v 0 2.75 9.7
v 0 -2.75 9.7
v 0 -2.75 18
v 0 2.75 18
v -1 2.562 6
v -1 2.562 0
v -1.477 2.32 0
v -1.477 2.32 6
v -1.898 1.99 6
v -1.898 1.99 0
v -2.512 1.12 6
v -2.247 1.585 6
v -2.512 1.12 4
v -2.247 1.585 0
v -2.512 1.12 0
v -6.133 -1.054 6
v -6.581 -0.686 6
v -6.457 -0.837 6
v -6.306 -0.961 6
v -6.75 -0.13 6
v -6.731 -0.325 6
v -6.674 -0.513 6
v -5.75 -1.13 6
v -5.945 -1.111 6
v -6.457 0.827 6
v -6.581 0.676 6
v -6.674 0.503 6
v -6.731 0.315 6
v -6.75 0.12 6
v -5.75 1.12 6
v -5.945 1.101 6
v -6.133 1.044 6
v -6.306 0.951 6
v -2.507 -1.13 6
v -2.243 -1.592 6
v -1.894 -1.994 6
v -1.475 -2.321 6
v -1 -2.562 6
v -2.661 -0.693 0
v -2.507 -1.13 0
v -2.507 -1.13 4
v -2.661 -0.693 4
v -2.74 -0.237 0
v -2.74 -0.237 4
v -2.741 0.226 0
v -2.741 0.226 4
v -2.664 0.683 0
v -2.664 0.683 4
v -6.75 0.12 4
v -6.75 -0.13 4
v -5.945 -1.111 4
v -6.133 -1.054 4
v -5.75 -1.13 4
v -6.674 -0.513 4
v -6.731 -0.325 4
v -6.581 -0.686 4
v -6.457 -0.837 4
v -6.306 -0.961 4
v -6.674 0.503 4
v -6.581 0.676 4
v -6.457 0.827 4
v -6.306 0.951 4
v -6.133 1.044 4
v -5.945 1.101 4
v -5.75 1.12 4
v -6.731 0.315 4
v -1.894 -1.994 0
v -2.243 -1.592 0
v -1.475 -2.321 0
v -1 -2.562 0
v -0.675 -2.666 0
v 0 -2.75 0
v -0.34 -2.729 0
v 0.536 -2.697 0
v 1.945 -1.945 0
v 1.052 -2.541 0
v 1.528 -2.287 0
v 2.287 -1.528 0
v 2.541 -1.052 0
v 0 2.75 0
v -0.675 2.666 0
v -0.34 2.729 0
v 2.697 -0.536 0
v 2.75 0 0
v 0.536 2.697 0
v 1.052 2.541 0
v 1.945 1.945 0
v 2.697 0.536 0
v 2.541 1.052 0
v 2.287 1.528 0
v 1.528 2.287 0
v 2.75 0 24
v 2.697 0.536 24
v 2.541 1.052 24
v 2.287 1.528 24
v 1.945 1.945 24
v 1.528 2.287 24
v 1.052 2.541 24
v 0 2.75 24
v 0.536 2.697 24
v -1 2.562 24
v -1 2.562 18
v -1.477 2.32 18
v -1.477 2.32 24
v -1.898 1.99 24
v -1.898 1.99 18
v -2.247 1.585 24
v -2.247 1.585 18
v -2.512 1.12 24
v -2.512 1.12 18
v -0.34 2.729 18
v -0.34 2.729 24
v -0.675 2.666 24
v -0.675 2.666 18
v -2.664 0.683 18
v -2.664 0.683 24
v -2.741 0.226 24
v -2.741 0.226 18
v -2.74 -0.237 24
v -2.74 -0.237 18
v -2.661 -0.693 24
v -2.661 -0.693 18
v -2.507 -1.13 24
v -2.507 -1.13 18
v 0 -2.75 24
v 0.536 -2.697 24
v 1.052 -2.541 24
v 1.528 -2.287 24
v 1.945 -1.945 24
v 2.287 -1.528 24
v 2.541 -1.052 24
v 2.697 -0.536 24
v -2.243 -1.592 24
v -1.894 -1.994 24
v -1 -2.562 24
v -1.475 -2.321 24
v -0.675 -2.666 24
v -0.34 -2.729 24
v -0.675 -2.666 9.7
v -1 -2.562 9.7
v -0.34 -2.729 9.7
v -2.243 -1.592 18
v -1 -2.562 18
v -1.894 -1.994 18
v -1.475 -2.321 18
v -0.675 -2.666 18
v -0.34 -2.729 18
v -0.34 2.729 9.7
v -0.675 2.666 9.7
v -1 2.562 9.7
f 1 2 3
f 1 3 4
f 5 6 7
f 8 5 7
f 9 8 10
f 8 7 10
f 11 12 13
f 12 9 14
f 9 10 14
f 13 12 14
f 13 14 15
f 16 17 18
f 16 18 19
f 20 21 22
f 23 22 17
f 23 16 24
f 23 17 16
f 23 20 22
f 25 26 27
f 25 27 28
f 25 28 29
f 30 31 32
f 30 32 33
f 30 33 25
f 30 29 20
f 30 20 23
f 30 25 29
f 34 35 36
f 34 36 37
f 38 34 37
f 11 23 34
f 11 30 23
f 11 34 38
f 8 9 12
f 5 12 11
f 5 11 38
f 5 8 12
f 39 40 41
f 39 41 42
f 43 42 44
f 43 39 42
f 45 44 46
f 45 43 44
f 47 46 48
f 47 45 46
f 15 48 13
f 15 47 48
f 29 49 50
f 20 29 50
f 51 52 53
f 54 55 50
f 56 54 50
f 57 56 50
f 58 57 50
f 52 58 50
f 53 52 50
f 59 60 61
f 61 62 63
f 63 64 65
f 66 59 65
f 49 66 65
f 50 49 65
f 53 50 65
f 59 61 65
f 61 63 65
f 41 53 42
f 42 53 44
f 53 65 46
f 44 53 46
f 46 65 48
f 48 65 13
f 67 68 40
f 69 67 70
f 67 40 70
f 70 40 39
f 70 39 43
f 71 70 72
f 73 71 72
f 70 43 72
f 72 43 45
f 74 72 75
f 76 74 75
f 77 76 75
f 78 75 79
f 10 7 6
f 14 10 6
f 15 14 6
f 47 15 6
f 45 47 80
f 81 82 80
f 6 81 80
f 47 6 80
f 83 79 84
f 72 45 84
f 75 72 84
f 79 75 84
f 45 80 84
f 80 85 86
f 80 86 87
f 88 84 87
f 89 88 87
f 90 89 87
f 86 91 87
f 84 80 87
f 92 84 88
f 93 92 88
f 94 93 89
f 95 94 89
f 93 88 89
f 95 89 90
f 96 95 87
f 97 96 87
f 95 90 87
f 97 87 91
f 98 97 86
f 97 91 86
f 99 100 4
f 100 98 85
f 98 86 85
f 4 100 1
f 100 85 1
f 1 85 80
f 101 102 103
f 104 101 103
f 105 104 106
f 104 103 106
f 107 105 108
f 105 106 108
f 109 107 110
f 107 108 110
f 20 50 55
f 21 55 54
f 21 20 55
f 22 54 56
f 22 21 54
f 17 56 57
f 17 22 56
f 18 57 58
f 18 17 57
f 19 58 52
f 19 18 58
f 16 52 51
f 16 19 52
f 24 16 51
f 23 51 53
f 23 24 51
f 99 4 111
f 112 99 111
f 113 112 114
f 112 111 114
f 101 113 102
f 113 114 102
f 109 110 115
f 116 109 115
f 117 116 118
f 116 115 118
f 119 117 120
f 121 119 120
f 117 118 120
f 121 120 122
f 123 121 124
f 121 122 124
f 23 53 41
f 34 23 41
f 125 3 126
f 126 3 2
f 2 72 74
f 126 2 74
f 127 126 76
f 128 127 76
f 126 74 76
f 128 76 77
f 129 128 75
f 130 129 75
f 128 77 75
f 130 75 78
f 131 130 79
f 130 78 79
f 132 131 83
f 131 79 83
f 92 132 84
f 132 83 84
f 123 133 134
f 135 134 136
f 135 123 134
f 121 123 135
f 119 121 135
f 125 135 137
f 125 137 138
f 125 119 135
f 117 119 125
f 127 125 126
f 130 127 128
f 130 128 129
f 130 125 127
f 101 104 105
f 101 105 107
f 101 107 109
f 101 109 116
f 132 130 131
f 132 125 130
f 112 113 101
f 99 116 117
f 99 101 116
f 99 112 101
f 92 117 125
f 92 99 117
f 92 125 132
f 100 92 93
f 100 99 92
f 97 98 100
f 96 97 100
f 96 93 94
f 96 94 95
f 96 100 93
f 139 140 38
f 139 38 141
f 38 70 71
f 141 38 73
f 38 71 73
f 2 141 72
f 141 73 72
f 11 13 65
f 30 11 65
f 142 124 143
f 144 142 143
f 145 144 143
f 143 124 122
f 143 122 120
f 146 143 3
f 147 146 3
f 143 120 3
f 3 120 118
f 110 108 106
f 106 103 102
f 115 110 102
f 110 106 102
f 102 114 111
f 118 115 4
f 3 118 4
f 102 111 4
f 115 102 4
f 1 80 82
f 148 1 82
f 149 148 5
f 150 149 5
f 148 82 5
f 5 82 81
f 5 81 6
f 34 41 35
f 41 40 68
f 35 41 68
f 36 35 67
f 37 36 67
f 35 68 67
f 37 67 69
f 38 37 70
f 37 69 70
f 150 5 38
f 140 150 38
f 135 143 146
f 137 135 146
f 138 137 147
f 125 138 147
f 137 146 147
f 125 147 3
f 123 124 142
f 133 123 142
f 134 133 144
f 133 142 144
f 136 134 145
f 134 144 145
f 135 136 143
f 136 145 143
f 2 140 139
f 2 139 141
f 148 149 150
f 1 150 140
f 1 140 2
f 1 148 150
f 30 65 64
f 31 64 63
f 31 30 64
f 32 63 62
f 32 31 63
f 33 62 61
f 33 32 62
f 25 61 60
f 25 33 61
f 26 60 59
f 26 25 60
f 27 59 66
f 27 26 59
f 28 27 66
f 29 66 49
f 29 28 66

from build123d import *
from build123d import SkipClean  # not in build123d's __all__

# Parameters (mm, degrees)
F1_DEPTH = 24
F2_DEPTH = 18
F3_DEPTH = 9.7
F4_DEPTH = 6
F5_DEPTH = 6
F6_R     = 1
F7_DEPTH = 4


with BuildPart() as f1:
    # F0 (on Top) → F1 (new body)
    with BuildSketch(Plane.XY):
        with BuildLine():
            ThreePointArc((0, -2.75), (1.9445436483, -1.9445436483), (2.75, 0))
            ThreePointArc((2.75, 0), (1.9445436483, 1.9445436483), (0, 2.75))
            Line((0, 2.75), (0, 1.12))
            Line((0, 1.12), (0, 0))
            Line((0, 0), (0, -1.13))
            Line((0, -1.13), (0, -2.75))
        make_face()
        with BuildLine():
            Line((0, 1.12), (0, 2.75))
            ThreePointArc((0, 2.75), (-0.5087835239, 2.7025246208), (-1, 2.5617376915))
            Line((-1, 2.5617376915), (-1, 1.12))
            Line((-1, 1.12), (0, 1.12))
        make_face()
        with BuildLine():
            ThreePointArc((-1, -2.5617376915), (-0.5087835239, -2.7025246208), (0, -2.75))
            Line((0, -2.75), (0, -1.13))
            Line((0, -1.13), (-1, -1.13))
            Line((-1, -1.13), (-1, -2.5617376915))
        make_face()
        with BuildLine():
            Line((-1, 1.12), (-1, 2.5617376915))
            ThreePointArc((-1, 2.5617376915), (-1.8980182962, 1.9899815445), (-2.5115931199, 1.12))
            Line((-2.5115931199, 1.12), (-1, 1.12))
        make_face()
        Polygon((0, 0), (0, 1.12), (-1, 1.12), (-1, -1.13), (0, -1.13), align=None)
        with BuildLine():
            ThreePointArc((-2.5071098899, -1.13), (-1.8940494052, -1.9937594767), (-1, -2.5617376915))
            Line((-1, -2.5617376915), (-1, -1.13))
            Line((-1, -1.13), (-2.5071098899, -1.13))
        make_face()
        with BuildLine():
            Line((-1, 1.12), (-2.5115931199, 1.12))
            ThreePointArc((-2.5115931199, 1.12), (-2.7499945409, -0.0054794925), (-2.5071098899, -1.13))
            Line((-2.5071098899, -1.13), (-1, -1.13))
            Line((-1, -1.13), (-1, 1.12))
        make_face()
    extrude(amount=F1_DEPTH)

    # F0 (on Top) → F2 (cut)
    with BuildSketch(Plane.XY):
        with BuildLine():
            Line((0, 1.12), (0, 2.75))
            ThreePointArc((0, 2.75), (-0.5087835239, 2.7025246208), (-1, 2.5617376915))
            Line((-1, 2.5617376915), (-1, 1.12))
            Line((-1, 1.12), (0, 1.12))
        make_face()
        with BuildLine():
            ThreePointArc((-1, -2.5617376915), (-0.5087835239, -2.7025246208), (0, -2.75))
            Line((0, -2.75), (0, -1.13))
            Line((0, -1.13), (-1, -1.13))
            Line((-1, -1.13), (-1, -2.5617376915))
        make_face()
        with BuildLine():
            Line((-1, 1.12), (-1, 2.5617376915))
            ThreePointArc((-1, 2.5617376915), (-1.8980182962, 1.9899815445), (-2.5115931199, 1.12))
            Line((-2.5115931199, 1.12), (-1, 1.12))
        make_face()
        Polygon((0, 0), (0, 1.12), (-1, 1.12), (-1, -1.13), (0, -1.13), align=None)
        with BuildLine():
            ThreePointArc((-2.5071098899, -1.13), (-1.8940494052, -1.9937594767), (-1, -2.5617376915))
            Line((-1, -2.5617376915), (-1, -1.13))
            Line((-1, -1.13), (-2.5071098899, -1.13))
        make_face()
        with BuildLine():
            Line((-1, 1.12), (-2.5115931199, 1.12))
            ThreePointArc((-2.5115931199, 1.12), (-2.7499945409, -0.0054794925), (-2.5071098899, -1.13))
            Line((-2.5071098899, -1.13), (-1, -1.13))
            Line((-1, -1.13), (-1, 1.12))
        make_face()
    extrude(amount=F2_DEPTH, mode=Mode.SUBTRACT)

    # F0 (on Top) → F3 (join)
    with BuildSketch(Plane.XY):
        with BuildLine():
            Line((0, 1.12), (0, 2.75))
            ThreePointArc((0, 2.75), (-0.5087835239, 2.7025246208), (-1, 2.5617376915))
            Line((-1, 2.5617376915), (-1, 1.12))
            Line((-1, 1.12), (0, 1.12))
        make_face()
        with BuildLine():
            ThreePointArc((-1, -2.5617376915), (-0.5087835239, -2.7025246208), (0, -2.75))
            Line((0, -2.75), (0, -1.13))
            Line((0, -1.13), (-1, -1.13))
            Line((-1, -1.13), (-1, -2.5617376915))
        make_face()
        Polygon((0, 0), (0, 1.12), (-1, 1.12), (-1, -1.13), (0, -1.13), align=None)
    extrude(amount=F3_DEPTH)

    # F0 (on Top) → F4 (join)
    with BuildSketch(Plane.XY):
        with BuildLine():
            Line((-1, 1.12), (-1, 2.5617376915))
            ThreePointArc((-1, 2.5617376915), (-1.8980182962, 1.9899815445), (-2.5115931199, 1.12))
            Line((-2.5115931199, 1.12), (-1, 1.12))
        make_face()
        with BuildLine():
            ThreePointArc((-2.5071098899, -1.13), (-1.8940494052, -1.9937594767), (-1, -2.5617376915))
            Line((-1, -2.5617376915), (-1, -1.13))
            Line((-1, -1.13), (-2.5071098899, -1.13))
        make_face()
        with BuildLine():
            Line((-1, 1.12), (-2.5115931199, 1.12))
            ThreePointArc((-2.5115931199, 1.12), (-2.7499945409, -0.0054794925), (-2.5071098899, -1.13))
            Line((-2.5071098899, -1.13), (-1, -1.13))
            Line((-1, -1.13), (-1, 1.12))
        make_face()
    extrude(amount=F4_DEPTH)

    # F0 (on Top) → F5 (join)
    with BuildSketch(Plane.XY):
        with BuildLine():
            ThreePointArc((-2.5071098899, -1.13), (-2.7499945409, -0.0054794925), (-2.5115931199, 1.12))
            Line((-2.5115931199, 1.12), (-6.75, 1.12))
            Line((-6.75, 1.12), (-6.75, -1.13))
            Line((-6.75, -1.13), (-2.5071098899, -1.13))
        make_face()
    extrude(amount=F5_DEPTH)

    # F6
    f6_edges = [f1.edges().sort_by_distance(p)[0] for p in [
        (-6.75, 1.12, 3),
        (-6.75, -1.13, 3),
    ]]
    fillet(f6_edges, radius=F6_R)

    # F0 (on Top) → F7 (cut)
    with BuildSketch(Plane.XY):
        with BuildLine():
            ThreePointArc((-2.5071098899, -1.13), (-2.7499945409, -0.0054794925), (-2.5115931199, 1.12))
            Line((-2.5115931199, 1.12), (-6.75, 1.12))
            Line((-6.75, 1.12), (-6.75, -1.13))
            Line((-6.75, -1.13), (-2.5071098899, -1.13))
        make_face()
    with SkipClean():  # cleaning this boolean's faces spoils the solid; the shape is the same uncleaned
        extrude(amount=F7_DEPTH, mode=Mode.SUBTRACT)


solid = f1.part
